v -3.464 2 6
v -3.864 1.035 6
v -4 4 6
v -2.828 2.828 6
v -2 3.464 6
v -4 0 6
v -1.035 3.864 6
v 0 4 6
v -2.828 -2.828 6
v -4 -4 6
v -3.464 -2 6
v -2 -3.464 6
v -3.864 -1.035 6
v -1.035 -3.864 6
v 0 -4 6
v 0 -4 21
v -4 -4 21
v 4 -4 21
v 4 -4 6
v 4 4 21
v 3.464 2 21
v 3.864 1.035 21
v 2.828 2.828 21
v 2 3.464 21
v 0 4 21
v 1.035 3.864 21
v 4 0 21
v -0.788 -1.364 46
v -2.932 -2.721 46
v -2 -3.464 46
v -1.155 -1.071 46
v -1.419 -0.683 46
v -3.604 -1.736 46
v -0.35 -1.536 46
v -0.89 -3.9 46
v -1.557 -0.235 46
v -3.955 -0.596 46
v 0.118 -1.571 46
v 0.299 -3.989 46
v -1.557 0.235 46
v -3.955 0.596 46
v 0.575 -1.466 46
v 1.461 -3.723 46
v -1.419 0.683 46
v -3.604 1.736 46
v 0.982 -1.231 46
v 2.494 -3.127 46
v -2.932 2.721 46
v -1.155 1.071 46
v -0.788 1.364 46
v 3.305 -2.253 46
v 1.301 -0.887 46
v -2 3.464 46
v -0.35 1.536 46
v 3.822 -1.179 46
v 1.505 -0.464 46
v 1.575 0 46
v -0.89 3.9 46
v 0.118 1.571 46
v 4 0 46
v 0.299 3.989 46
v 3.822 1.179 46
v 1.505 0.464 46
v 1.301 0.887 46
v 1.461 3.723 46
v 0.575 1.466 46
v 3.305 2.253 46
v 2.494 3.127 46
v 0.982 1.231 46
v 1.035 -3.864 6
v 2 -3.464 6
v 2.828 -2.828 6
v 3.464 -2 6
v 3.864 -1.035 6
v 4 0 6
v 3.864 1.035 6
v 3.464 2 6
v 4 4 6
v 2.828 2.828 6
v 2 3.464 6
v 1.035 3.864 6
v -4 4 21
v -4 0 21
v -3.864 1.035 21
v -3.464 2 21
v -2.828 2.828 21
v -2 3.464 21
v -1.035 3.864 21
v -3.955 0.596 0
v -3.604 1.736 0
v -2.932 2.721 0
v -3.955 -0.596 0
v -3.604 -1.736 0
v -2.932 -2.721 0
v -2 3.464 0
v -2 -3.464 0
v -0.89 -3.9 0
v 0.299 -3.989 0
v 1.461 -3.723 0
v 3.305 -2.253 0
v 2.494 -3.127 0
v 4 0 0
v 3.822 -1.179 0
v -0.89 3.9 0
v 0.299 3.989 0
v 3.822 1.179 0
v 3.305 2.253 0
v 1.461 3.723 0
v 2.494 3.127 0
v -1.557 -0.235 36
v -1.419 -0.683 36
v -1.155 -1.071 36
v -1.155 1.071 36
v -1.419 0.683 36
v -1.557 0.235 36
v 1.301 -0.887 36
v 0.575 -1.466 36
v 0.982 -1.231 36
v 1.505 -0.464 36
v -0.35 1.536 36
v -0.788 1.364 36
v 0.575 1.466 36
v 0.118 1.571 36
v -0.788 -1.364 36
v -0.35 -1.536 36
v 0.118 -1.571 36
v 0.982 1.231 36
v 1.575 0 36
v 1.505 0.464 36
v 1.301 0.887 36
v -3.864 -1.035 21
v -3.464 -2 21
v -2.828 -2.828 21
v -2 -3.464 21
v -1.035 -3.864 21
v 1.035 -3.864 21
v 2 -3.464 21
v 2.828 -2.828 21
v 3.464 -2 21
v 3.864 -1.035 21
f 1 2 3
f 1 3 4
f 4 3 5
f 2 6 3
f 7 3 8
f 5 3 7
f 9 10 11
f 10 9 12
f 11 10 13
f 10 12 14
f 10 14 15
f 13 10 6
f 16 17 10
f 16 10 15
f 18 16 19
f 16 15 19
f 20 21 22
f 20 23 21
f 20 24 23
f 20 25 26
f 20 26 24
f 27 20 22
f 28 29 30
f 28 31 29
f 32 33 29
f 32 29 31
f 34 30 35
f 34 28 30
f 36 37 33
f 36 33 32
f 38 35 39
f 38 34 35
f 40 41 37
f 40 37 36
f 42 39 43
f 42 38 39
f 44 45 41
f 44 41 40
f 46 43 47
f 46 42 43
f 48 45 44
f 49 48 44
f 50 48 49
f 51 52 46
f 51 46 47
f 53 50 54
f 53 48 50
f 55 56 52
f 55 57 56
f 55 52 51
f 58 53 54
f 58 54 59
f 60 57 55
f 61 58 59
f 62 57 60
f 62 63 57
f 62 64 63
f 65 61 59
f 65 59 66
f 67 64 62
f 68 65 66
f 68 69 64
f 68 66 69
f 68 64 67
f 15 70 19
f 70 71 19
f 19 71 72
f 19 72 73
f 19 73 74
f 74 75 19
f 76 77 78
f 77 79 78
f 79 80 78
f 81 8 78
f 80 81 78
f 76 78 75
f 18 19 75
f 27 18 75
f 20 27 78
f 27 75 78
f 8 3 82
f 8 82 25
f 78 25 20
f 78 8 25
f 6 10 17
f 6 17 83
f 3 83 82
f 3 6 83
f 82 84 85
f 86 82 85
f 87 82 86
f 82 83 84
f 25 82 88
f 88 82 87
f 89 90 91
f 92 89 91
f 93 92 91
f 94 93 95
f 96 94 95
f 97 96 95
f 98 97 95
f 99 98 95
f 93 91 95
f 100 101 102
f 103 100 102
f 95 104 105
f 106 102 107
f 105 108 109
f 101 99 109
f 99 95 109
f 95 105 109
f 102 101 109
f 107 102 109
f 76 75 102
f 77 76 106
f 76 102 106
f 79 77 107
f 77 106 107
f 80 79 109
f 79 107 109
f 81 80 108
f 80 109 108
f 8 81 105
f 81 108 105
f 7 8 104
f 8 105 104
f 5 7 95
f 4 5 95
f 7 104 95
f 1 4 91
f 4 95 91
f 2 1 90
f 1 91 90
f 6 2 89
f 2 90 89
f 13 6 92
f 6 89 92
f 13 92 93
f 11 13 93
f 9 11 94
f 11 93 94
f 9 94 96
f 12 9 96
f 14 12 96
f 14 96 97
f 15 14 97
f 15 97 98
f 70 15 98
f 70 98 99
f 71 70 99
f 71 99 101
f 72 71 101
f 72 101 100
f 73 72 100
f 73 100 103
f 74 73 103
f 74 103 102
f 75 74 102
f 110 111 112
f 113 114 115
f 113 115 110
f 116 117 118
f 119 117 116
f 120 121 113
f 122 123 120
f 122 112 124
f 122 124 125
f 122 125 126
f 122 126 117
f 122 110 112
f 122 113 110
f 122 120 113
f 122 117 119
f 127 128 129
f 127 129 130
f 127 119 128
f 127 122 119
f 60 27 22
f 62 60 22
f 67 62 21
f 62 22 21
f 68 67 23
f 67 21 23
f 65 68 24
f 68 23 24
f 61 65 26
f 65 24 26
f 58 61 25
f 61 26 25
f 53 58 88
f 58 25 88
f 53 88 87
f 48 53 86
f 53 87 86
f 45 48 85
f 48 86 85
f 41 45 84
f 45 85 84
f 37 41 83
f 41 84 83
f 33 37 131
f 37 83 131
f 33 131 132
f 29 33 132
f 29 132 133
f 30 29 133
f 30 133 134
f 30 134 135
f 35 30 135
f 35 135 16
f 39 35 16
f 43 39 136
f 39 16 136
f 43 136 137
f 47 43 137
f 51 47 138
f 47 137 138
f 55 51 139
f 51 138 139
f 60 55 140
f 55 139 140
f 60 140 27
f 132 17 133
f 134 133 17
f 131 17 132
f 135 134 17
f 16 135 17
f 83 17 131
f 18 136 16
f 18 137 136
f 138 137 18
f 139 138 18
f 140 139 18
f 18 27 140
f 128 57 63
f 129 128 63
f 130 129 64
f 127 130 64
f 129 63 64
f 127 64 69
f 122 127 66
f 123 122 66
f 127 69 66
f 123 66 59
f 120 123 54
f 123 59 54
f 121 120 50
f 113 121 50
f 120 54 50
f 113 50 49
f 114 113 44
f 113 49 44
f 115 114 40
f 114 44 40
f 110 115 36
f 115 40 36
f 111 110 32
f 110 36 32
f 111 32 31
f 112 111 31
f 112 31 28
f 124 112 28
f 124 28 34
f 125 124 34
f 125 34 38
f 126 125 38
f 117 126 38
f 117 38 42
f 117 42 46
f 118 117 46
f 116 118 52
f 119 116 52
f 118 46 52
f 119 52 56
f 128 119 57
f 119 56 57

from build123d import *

# Parameters (mm, degrees)
F0_R     = 4
F1_DEPTH = 6
F2_W     = 8
F2_H     = 8
F3_DEPTH = 15
F4_R     = 4
F5_DEPTH = 25
F6_R     = 1.575
F7_DEPTH = 10


with BuildPart() as f1:
    # F0 (on Top) → F1 (new body)
    with BuildSketch(Plane.XY):
        Circle(F0_R)
    extrude(amount=F1_DEPTH)

    # F2 (on face) → F3 (join)
    with BuildSketch(Plane.XY.offset(6)):
        Rectangle(F2_W, F2_H)
    extrude(amount=F3_DEPTH)

    # F4 (on face) → F5 (join)
    with BuildSketch(Plane.XY.offset(21)):
        Circle(F4_R)
    extrude(amount=F5_DEPTH)

    # F6 (on face) → F7 (cut)
    with BuildSketch(Plane.XY.offset(46)):
        Circle(F6_R)
    extrude(amount=-F7_DEPTH, mode=Mode.SUBTRACT)


solid = f1.part
